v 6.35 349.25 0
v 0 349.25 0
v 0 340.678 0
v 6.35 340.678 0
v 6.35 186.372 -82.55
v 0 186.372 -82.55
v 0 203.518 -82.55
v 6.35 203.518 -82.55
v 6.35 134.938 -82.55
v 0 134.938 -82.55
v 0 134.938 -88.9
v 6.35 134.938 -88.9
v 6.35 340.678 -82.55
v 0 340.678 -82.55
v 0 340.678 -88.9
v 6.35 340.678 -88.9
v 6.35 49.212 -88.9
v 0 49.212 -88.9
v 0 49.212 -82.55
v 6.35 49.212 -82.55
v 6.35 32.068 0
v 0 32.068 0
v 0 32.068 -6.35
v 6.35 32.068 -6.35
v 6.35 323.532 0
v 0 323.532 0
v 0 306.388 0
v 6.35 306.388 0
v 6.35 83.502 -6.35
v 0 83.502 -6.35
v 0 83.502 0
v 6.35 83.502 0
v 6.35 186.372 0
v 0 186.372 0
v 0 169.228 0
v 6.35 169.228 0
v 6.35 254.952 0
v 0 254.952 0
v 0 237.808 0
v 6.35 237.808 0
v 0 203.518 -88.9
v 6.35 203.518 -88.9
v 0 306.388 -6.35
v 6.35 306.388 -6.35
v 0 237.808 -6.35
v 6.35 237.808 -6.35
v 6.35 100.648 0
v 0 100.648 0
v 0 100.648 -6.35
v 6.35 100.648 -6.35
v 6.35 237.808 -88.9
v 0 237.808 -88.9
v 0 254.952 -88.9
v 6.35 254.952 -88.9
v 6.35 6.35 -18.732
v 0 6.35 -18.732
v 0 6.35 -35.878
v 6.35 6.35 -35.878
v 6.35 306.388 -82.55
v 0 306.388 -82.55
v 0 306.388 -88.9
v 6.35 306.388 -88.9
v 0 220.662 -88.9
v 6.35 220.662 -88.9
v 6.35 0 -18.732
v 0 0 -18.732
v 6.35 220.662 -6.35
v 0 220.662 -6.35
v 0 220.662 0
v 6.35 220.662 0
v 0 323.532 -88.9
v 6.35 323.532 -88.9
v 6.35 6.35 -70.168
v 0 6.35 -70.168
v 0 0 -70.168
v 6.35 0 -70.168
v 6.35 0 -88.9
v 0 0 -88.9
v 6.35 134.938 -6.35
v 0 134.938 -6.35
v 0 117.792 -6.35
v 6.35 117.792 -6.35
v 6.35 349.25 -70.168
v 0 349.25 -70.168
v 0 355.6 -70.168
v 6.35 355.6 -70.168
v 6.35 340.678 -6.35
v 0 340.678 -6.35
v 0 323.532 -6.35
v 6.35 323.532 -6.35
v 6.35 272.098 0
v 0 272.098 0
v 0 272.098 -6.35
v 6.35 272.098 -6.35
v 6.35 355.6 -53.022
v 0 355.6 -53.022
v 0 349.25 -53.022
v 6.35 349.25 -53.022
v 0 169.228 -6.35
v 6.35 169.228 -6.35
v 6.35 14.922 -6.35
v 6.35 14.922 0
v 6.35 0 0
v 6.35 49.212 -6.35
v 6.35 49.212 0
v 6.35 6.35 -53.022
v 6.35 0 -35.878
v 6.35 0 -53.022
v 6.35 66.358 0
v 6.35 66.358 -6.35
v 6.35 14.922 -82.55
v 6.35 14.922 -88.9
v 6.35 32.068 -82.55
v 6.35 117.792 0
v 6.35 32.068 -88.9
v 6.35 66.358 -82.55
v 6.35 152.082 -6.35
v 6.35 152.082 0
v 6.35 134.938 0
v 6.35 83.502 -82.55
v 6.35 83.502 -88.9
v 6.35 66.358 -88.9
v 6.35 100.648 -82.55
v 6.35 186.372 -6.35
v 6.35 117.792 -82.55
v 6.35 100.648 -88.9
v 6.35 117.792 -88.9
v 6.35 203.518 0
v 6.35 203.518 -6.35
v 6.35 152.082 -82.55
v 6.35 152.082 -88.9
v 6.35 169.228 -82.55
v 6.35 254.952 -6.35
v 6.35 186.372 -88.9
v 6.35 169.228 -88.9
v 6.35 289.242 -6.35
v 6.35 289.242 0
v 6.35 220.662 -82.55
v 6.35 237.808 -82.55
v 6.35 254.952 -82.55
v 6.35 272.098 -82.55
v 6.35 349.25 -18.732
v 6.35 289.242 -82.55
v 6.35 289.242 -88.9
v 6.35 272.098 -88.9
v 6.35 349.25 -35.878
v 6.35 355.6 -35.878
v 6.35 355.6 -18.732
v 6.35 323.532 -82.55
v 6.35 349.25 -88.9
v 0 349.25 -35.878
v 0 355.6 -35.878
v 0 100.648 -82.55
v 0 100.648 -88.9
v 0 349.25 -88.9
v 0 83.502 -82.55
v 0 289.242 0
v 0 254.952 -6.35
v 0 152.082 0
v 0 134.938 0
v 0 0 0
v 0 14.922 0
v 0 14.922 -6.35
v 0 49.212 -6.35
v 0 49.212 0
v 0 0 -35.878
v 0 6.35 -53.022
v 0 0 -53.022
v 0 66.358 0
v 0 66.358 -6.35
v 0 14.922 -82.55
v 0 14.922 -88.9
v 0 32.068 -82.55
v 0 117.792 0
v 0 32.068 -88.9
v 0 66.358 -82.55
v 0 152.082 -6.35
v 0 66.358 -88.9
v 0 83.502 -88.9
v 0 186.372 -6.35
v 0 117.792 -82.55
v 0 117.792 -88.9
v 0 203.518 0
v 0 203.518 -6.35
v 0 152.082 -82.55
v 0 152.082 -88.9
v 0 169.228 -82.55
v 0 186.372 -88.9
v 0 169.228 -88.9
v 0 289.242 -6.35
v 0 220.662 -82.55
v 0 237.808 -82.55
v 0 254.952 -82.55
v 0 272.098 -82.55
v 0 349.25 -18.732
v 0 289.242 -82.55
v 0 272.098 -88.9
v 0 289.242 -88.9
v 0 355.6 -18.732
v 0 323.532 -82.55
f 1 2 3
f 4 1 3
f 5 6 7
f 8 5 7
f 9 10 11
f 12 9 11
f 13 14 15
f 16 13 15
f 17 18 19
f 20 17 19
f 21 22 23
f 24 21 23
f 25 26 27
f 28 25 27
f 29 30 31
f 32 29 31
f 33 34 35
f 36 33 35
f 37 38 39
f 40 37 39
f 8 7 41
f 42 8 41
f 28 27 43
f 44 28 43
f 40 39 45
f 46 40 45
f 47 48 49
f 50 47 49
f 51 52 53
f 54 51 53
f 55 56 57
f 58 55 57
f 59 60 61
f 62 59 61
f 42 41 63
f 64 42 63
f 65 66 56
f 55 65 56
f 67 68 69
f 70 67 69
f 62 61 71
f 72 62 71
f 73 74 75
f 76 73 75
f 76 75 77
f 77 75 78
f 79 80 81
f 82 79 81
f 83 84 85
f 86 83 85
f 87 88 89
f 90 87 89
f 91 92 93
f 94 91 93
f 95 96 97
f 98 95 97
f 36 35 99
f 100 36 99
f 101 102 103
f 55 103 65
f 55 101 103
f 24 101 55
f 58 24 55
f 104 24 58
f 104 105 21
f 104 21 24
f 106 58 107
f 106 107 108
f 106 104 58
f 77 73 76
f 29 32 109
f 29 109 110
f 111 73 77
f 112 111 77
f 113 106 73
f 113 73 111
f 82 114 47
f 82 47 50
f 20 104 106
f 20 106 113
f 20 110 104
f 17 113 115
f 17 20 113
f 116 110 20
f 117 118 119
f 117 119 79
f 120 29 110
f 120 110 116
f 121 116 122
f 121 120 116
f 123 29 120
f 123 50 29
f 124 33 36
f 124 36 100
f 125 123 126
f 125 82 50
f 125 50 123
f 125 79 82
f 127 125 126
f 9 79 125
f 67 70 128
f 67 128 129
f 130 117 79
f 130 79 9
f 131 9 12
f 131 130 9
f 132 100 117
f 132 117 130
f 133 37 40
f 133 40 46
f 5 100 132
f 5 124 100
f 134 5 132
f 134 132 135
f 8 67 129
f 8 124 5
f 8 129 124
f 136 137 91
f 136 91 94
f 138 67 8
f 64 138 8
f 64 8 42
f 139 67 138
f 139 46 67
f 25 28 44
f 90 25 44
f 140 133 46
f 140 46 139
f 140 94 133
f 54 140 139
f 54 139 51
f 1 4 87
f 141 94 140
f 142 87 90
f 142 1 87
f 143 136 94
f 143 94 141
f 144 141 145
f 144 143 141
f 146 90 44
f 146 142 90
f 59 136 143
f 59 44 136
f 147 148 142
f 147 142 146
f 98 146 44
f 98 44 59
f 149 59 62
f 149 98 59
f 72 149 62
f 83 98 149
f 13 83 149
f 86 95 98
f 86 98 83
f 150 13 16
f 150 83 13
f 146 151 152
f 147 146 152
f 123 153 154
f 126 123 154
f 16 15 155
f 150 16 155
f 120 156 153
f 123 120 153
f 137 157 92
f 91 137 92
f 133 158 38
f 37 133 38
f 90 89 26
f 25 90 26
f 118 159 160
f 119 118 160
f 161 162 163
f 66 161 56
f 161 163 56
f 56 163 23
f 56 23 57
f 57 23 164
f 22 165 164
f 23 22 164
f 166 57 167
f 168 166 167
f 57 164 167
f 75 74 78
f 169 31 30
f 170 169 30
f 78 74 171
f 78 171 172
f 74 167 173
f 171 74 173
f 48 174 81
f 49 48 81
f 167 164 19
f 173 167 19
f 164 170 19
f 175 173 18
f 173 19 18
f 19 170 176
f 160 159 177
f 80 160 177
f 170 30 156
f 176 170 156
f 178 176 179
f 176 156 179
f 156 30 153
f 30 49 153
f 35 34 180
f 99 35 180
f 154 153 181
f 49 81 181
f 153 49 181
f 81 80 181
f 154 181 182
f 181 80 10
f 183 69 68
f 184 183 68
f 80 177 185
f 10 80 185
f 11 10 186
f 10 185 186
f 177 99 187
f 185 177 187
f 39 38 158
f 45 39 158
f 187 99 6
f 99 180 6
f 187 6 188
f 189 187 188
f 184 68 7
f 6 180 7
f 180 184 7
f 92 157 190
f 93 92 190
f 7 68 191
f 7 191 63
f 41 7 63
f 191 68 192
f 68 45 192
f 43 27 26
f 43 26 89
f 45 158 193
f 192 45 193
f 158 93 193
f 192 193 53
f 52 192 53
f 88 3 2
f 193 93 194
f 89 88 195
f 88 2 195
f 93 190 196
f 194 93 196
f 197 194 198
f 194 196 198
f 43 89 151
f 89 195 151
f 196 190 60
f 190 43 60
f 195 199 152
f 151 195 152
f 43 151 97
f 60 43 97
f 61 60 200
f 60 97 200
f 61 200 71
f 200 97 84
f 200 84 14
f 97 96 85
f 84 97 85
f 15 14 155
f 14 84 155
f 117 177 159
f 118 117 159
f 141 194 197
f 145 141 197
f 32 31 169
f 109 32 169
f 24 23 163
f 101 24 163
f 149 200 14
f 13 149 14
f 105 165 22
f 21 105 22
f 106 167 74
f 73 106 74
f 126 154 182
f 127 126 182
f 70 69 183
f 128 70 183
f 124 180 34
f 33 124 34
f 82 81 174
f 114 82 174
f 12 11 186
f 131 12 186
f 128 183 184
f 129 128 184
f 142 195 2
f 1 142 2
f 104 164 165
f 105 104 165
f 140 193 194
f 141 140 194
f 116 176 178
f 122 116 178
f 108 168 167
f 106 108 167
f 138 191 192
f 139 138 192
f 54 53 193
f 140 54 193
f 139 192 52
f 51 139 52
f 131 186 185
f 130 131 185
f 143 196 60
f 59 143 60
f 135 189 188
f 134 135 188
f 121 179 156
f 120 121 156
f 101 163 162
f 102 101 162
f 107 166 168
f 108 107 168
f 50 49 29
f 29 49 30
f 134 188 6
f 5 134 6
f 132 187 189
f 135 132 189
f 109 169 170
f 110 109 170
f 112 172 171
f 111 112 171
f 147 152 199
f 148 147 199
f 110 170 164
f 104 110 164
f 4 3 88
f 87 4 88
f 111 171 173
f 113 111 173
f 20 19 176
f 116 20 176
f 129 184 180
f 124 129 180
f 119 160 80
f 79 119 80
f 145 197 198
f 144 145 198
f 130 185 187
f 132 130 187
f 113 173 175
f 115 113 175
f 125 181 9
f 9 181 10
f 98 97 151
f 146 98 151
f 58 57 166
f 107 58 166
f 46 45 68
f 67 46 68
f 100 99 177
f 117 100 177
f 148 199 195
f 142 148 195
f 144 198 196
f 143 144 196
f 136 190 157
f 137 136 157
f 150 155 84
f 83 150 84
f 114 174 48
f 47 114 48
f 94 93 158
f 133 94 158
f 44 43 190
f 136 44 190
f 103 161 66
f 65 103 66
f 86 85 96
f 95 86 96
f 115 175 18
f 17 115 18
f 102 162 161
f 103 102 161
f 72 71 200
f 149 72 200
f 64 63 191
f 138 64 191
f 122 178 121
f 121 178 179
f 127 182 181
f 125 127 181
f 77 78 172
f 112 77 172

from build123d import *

# Parameters (mm, degrees)
BOSS_EXTRUDE1_DEPTH = 6.35


with BuildPart() as part:
    # Sketch1 → Boss-Extrude1 (new body)
    with BuildSketch(Plane(origin=(0, 0, 0), x_dir=(0, 0, -1), z_dir=(1, 0, 0))):
        Polygon((0, 14.9225), (0, 6.35), (0, 0), (6.35, 0), (18.7325, 0), (18.7325, 6.35), (35.8775, 6.35), (35.8775, 0), (53.0225, 0), (53.0225, 6.35), (70.1675, 6.35), (70.1675, 0), (82.55, 0), (88.9, 0), (88.9, 6.35), (88.9, 14.9225), (82.55, 14.9225), (82.55, 32.0675), (88.9, 32.0675), (88.9, 49.2125), (82.55, 49.2125), (82.55, 66.3575), (88.9, 66.3575), (88.9, 83.5025), (82.55, 83.5025), (82.55, 100.6475), (88.9, 100.6475), (88.9, 117.7925), (82.55, 117.7925), (82.55, 134.9375), (88.9, 134.9375), (88.9, 152.0825), (82.55, 152.0825), (82.55, 169.2275), (88.9, 169.2275), (88.9, 186.3725), (82.55, 186.3725), (82.55, 203.5175), (88.9, 203.5175), (88.9, 220.6625), (82.55, 220.6625), (82.55, 237.8075), (88.9, 237.8075), (88.9, 254.9525), (82.55, 254.9525), (82.55, 272.0975), (88.9, 272.0975), (88.9, 289.2425), (82.55, 289.2425), (82.55, 306.3875), (88.9, 306.3875), (88.9, 323.5325), (82.55, 323.5325), (82.55, 340.6775), (88.9, 340.6775), (88.9, 349.25), (70.1675, 349.25), (70.1675, 355.6), (53.0225, 355.6), (53.0225, 349.25), (35.8775, 349.25), (35.8775, 355.6), (18.7325, 355.6), (18.7325, 349.25), (6.35, 349.25), (0, 349.25), (0, 340.6775), (6.35, 340.6775), (6.35, 334.518000001), (6.35, 329.692000001), (6.35, 323.5325), (0, 323.5325), (0, 306.3875), (6.35, 306.3875), (6.35, 289.2425), (0, 289.2425), (0, 272.0975), (6.35, 272.0975), (6.35, 254.9525), (0, 254.9525), (0, 237.8075), (6.35, 237.8075), (6.35, 220.6625), (0, 220.6625), (0, 203.5175), (6.35, 203.5175), (6.35, 186.3725), (0, 186.3725), (0, 169.2275), (6.35, 169.2275), (6.35, 152.0825), (0, 152.0825), (0, 134.9375), (6.35, 134.9375), (6.35, 117.7925), (0, 117.7925), (0, 100.6475), (6.35, 100.6475), (6.35, 83.5025), (0, 83.5025), (0, 66.3575), (6.35, 66.3575), (6.35, 49.2125), (0, 49.2125), (0, 32.0675), (6.35, 32.0675), (6.35, 25.907999999), (6.35, 21.081999999), (6.35, 14.9225), align=None)
    extrude(amount=BOSS_EXTRUDE1_DEPTH)


solid = part.part
